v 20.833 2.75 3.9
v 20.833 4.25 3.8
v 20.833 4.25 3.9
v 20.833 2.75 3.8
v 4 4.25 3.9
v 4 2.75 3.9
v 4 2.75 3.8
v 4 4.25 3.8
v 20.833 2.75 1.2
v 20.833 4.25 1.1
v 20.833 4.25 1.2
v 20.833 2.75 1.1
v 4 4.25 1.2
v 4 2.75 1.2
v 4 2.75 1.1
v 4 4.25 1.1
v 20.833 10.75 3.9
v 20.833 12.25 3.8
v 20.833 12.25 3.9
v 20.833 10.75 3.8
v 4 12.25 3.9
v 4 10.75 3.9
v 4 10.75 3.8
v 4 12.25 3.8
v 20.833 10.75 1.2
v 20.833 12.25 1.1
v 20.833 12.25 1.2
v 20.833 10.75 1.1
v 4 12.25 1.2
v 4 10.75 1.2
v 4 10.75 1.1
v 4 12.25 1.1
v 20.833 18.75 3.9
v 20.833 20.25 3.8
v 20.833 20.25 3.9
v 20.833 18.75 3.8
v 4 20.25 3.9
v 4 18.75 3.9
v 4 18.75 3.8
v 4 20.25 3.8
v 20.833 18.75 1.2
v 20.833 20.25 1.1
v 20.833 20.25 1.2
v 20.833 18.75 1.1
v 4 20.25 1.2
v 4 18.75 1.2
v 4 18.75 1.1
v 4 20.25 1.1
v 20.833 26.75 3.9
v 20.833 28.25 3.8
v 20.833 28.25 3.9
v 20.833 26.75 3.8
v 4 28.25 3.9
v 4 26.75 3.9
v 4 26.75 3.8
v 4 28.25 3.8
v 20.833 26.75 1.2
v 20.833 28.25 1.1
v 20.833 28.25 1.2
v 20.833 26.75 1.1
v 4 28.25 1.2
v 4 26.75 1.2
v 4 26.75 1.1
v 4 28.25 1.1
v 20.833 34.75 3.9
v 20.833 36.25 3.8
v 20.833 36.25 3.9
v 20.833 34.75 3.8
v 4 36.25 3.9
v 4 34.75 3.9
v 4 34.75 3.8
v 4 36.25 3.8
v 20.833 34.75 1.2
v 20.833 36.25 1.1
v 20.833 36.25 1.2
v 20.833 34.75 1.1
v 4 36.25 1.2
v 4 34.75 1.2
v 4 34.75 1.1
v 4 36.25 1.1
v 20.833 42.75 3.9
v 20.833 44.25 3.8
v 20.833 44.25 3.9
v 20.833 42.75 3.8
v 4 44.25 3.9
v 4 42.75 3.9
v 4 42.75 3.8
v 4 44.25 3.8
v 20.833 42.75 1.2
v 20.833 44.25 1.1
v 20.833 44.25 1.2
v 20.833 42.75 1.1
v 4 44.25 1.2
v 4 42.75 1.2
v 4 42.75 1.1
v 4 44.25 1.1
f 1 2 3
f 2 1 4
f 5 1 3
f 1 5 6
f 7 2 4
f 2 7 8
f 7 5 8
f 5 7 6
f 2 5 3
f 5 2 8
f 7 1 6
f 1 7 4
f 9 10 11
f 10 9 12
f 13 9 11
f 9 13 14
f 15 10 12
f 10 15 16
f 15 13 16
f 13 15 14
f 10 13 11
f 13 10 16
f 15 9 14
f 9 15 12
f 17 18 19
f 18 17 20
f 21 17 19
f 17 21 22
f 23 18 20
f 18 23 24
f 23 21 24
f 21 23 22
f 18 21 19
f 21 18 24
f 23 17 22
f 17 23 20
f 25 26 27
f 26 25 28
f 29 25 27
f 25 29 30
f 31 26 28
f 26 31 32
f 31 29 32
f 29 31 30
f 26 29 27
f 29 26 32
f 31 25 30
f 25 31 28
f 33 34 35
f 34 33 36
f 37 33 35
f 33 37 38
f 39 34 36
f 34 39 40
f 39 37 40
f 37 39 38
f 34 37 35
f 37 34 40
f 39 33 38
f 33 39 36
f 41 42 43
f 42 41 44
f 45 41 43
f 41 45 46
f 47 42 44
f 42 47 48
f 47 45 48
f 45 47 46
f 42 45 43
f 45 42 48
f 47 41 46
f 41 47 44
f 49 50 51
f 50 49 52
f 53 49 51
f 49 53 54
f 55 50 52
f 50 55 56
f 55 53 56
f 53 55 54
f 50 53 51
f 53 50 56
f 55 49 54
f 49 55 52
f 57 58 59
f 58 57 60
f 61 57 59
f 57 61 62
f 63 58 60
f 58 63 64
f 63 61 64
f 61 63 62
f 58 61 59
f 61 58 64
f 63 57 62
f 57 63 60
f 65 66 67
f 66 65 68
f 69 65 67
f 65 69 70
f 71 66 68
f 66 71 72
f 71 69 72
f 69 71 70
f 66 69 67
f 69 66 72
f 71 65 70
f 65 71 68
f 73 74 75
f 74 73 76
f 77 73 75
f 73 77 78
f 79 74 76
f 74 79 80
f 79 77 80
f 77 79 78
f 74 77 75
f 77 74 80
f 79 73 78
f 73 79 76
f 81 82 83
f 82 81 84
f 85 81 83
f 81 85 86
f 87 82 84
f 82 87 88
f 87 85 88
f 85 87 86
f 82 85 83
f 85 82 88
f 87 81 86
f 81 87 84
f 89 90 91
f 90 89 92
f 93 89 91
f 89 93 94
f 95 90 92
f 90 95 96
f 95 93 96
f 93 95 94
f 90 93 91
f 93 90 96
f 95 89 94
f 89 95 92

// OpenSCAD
/*
 * ELECTRODOS DEL REACTOR DBD
 * Para impresión con material conductor (filamento de cobre/grafeno)
 */

// Parámetros (copiados de reactor_3d.scad)
channel_width = 3.0;
channel_height = 1.0;
channel_length = 250;
wall_thickness = 2.0;
n_turns = 6;
electrode_width = 1.5;
electrode_thickness = 0.1;
dielectric_thickness = 0.8;

$fn = 32;

// Cálculos
straight_length = channel_length / (2 * n_turns);
total_depth = n_turns * (channel_width + wall_thickness * 2) + wall_thickness;
total_height = channel_height + wall_thickness * 2 + dielectric_thickness * 2;

// Electrodo individual
module electrode(length, width, thickness) {
    cube([length, width, thickness]);
}

// Par de electrodos para un tramo
module electrode_pair(length) {
    // Electrodo superior
    translate([0, 0, channel_height + dielectric_thickness])
        electrode(length, electrode_width, electrode_thickness);

    // Electrodo inferior
    translate([0, 0, -dielectric_thickness - electrode_thickness])
        electrode(length, electrode_width, electrode_thickness);
}

// Sistema completo de electrodos
module electrodes_only() {
    for (i = [0:n_turns-1]) {
        y_offset = wall_thickness + (channel_width - electrode_width)/2 +
                  i * (channel_width * 2 + wall_thickness);

        translate([wall_thickness + wall_thickness,
                  y_offset,
                  wall_thickness]) {
            electrode_pair(straight_length - wall_thickness * 2);
        }
    }
}

// Renderizar solo electrodos
electrodes_only();

echo("═══════════════════════════════════════════════════════════════");
echo("  ELECTRODOS - Para impresión con filamento conductor");
echo("═══════════════════════════════════════════════════════════════");
echo(str("  Número de pares: ", n_turns));
echo(str("  Longitud electrodo: ", straight_length - wall_thickness * 2, " mm"));
echo(str("  Ancho: ", electrode_width, " mm"));
echo(str("  Espesor: ", electrode_thickness, " mm"));
echo("═══════════════════════════════════════════════════════════════");
